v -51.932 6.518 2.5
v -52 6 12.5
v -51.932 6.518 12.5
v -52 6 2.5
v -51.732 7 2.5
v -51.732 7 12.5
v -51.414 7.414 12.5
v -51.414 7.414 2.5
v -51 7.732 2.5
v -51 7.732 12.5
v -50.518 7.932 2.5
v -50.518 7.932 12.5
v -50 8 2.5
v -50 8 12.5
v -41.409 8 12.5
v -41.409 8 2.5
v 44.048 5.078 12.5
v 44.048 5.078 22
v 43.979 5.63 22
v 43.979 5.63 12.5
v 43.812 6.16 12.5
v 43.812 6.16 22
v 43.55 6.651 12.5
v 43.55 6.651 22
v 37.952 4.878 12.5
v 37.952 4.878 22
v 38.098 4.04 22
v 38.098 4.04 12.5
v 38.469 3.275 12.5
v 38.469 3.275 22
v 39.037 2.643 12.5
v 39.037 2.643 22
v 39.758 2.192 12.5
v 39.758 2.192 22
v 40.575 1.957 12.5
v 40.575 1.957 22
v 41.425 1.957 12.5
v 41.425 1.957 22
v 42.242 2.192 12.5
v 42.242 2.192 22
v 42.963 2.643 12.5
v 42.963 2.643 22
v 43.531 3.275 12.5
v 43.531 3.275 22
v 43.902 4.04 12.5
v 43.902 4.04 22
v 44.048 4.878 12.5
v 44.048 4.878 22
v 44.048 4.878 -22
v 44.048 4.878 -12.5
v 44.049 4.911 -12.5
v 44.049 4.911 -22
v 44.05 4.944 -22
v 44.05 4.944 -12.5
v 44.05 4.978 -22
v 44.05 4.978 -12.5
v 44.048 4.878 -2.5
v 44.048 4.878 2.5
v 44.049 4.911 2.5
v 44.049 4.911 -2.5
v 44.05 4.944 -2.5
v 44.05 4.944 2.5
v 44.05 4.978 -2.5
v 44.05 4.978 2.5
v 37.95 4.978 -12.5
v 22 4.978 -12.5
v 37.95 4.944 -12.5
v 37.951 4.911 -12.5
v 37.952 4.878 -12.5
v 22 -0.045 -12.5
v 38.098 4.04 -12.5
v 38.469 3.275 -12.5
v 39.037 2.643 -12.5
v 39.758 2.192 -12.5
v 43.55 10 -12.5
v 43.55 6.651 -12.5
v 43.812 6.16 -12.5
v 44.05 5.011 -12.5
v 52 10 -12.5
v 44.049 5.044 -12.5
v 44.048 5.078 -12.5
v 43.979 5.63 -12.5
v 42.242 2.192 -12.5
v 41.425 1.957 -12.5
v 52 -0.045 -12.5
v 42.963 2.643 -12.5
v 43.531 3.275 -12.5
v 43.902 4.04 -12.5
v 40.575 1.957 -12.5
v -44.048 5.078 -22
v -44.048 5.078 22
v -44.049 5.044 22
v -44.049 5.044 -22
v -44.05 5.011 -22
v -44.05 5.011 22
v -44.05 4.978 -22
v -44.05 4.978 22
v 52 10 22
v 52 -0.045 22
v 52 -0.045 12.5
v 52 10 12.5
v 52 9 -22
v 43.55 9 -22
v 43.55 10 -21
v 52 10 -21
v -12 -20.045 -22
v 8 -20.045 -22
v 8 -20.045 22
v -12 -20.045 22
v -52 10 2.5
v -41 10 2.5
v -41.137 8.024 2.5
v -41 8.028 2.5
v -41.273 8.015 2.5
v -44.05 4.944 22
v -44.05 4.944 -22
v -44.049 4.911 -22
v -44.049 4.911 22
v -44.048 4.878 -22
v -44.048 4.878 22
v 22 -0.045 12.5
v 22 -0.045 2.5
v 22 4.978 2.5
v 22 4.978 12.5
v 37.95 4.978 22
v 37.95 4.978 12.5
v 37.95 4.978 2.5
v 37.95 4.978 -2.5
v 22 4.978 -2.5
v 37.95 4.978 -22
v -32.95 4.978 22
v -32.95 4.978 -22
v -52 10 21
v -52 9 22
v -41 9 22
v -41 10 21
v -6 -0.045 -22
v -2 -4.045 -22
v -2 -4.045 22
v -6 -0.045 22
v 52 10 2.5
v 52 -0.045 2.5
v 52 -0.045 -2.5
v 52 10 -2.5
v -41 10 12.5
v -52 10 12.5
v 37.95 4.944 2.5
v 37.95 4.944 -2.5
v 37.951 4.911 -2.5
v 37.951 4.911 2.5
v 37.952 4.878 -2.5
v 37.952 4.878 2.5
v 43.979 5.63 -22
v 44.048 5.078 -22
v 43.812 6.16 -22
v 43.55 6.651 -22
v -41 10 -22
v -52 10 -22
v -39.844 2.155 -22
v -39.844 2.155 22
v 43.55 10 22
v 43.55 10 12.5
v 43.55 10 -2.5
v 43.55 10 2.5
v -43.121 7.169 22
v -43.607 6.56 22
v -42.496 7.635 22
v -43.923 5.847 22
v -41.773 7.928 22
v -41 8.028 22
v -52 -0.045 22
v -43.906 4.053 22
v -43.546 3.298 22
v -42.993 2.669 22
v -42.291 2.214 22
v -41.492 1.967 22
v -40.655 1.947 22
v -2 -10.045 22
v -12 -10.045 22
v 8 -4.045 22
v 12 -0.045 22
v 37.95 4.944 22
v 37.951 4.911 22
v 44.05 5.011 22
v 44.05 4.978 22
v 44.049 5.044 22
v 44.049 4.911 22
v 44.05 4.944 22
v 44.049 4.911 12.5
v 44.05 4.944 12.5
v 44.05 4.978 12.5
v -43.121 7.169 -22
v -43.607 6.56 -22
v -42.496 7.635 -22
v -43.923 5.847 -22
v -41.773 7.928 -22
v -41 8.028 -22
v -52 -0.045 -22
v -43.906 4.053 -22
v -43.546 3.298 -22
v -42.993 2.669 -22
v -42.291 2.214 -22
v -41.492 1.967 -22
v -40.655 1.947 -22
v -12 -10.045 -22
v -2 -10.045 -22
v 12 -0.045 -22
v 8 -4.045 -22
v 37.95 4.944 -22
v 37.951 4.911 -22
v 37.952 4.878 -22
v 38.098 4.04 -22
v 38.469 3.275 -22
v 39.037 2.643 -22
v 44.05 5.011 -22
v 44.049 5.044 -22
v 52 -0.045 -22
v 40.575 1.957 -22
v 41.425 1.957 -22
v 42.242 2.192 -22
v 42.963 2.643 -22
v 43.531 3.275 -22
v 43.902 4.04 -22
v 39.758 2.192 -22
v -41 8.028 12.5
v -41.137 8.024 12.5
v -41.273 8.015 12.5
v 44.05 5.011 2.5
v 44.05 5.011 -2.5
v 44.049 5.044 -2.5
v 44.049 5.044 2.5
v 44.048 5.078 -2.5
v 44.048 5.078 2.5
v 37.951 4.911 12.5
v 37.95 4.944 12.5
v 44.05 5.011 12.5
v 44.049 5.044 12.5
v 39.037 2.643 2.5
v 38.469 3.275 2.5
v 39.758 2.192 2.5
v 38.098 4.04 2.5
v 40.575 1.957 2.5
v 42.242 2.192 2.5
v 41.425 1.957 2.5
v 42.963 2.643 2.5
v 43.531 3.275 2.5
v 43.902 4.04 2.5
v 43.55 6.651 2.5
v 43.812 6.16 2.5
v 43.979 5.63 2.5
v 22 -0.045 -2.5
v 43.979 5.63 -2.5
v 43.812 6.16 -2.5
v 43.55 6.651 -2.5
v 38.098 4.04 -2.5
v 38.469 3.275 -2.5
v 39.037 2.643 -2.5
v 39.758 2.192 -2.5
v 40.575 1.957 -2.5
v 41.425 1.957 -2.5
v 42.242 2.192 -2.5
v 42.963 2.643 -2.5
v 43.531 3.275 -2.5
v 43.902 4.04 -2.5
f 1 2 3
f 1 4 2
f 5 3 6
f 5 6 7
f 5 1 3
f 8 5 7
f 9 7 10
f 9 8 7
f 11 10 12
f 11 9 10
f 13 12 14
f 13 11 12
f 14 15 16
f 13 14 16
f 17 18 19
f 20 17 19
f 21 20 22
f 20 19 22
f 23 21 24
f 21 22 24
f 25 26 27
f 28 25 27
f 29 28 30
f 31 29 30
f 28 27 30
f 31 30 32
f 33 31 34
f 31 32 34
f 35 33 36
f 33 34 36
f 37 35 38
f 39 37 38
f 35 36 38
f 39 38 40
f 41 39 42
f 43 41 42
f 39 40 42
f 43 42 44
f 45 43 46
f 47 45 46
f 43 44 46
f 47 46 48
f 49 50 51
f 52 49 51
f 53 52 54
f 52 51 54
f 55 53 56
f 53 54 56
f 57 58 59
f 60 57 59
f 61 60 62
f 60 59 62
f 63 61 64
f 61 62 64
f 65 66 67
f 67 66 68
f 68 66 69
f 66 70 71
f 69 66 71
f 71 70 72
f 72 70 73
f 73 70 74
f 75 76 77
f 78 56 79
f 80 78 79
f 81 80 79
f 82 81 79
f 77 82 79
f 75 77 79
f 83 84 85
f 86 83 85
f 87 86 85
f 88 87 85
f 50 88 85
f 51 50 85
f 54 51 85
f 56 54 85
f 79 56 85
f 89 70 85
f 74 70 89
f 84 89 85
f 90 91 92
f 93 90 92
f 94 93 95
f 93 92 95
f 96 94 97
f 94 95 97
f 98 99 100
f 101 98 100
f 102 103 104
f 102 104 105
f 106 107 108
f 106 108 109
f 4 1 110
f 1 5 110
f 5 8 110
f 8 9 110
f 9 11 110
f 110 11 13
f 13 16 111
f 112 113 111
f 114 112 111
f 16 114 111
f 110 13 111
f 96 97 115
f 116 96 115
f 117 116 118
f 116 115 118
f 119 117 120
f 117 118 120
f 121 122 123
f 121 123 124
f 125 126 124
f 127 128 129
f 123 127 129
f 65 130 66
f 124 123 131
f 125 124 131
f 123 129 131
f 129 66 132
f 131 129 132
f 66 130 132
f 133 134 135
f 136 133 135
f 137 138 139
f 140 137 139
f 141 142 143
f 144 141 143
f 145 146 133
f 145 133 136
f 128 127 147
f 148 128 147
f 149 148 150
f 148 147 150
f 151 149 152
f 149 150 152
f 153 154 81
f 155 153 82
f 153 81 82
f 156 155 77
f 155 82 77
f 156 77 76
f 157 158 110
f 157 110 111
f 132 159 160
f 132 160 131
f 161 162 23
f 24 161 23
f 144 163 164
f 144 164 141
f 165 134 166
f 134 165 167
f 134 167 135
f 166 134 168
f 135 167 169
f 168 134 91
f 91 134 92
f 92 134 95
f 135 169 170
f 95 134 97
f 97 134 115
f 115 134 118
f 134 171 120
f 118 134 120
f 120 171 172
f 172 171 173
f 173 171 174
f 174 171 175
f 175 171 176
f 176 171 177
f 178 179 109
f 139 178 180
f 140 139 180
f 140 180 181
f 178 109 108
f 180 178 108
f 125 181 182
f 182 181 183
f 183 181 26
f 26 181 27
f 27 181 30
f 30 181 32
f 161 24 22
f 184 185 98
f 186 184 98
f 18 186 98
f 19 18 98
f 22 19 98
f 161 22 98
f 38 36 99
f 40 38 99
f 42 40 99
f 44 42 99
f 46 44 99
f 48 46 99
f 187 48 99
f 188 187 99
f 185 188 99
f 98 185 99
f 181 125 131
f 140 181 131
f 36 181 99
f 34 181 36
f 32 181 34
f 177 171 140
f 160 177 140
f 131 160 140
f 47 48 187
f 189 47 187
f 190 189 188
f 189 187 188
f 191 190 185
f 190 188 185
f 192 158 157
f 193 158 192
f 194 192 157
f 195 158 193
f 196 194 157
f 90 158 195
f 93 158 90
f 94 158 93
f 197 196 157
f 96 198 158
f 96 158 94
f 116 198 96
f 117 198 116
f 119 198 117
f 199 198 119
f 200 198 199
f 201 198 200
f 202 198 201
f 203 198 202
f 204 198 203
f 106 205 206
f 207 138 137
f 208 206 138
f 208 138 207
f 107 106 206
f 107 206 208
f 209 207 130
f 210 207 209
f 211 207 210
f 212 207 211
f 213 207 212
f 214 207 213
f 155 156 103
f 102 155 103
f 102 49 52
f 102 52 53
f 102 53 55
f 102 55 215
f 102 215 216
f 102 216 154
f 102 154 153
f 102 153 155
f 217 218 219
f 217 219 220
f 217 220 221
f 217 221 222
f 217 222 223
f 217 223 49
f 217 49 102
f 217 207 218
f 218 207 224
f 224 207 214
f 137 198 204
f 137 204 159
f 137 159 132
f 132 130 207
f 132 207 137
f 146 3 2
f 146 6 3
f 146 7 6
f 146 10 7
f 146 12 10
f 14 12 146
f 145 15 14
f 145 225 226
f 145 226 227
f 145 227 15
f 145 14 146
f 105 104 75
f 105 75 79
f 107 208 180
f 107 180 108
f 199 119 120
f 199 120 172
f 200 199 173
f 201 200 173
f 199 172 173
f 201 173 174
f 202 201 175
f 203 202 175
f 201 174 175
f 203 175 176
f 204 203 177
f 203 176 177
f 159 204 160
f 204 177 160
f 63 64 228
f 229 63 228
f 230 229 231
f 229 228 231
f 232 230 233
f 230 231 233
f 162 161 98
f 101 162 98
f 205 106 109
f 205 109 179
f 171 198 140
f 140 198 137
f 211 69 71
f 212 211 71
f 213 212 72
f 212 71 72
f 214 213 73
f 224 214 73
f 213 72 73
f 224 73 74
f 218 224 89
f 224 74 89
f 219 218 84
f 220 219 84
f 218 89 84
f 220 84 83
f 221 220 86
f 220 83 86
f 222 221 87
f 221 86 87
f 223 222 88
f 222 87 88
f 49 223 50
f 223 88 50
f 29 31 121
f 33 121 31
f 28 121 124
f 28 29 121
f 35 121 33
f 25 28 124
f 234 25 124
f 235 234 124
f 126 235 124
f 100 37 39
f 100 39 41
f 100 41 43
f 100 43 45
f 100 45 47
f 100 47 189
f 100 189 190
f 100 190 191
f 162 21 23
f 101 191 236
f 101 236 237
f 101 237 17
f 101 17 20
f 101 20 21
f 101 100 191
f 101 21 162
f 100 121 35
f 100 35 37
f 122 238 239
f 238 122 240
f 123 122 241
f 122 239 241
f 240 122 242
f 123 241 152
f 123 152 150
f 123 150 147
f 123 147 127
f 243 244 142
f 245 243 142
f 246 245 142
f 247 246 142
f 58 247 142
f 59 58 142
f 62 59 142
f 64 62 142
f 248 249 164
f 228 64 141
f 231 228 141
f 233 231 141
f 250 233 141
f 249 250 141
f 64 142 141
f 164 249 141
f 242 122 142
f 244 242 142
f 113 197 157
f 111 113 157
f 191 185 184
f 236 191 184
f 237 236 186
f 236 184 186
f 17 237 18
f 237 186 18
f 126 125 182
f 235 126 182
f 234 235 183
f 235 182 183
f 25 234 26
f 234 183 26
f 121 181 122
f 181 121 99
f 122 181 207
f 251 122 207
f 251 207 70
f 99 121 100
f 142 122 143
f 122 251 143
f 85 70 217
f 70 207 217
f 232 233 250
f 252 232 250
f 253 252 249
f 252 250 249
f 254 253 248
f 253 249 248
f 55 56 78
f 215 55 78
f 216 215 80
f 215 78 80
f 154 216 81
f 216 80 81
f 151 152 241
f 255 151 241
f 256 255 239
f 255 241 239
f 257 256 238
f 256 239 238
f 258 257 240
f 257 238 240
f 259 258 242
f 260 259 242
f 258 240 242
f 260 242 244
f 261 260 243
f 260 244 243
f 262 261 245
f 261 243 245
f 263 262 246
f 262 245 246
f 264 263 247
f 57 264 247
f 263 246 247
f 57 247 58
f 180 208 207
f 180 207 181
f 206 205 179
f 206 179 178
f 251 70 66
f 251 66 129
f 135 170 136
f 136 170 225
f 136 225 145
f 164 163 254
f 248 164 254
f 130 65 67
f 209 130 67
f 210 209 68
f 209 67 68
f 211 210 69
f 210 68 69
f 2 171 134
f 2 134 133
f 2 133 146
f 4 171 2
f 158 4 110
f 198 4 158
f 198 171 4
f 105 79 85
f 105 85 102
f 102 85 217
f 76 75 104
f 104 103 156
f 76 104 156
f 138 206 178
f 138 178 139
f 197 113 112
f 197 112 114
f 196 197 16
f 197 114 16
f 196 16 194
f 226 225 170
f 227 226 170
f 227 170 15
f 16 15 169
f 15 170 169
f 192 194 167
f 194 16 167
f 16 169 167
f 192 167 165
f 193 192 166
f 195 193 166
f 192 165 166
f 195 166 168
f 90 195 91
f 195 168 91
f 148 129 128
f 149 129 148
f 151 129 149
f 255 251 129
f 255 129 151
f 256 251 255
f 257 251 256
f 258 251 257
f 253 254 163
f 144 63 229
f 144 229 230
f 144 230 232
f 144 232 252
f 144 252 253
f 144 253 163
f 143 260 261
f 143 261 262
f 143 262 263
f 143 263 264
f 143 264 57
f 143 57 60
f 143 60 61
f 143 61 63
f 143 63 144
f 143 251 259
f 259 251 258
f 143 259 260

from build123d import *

# Parameters (mm, degrees)
EXTRUDE_1_DEPTH      = 10
EXTRUDE_1_DEPTH_BACK = 0.044975992
SKETCH_1_W           = 104
SKETCH_1_H           = 44
EXTRUDE_2_DEPTH      = 44
CUT_EXTRUDE_1_DEPTH  = 44
CHAMFER_4_SIZE       = 4
SKETCH_9_W           = 30
SKETCH_9_H           = 10
CUT_EXTRUDE_5_DEPTH  = 10.044975992
CUT_EXTRUDE_6_REACH  = 81.761
SKETCH_10_W          = 10
SKETCH_10_H          = 2
CUT_EXTRUDE_8_REACH  = 73.006
FILLET_1_R           = 2
CHAMFER_6_SIZE       = 1
CUT_EXTRUDE_9_DEPTH  = 44


with BuildPart() as part:
    # 草图1 → 凸台-拉伸1 (new, two sides: drawn at the far end of the back side and taken through both)
    with BuildSketch(Plane(origin=(0, 0, 0), x_dir=(1, 0, 0), z_dir=(0, 1, 0)).offset(-EXTRUDE_1_DEPTH_BACK)):
        Rectangle(SKETCH_1_W, SKETCH_1_H)
    extrude(amount=EXTRUDE_1_DEPTH + EXTRUDE_1_DEPTH_BACK)

    # 草图2 → 凸台-拉伸2 (add)
    with BuildSketch(Plane(origin=(0, 0, -22), x_dir=(-1, 0, 0), z_dir=(0, 0, -1))):
        Polygon((12, -20.044975992), (12, -10.044975992), (2, -10.044975992), (2, -0.044975992), (-8, -0.044975992), (-8, -10.525129165), (-8, -20.044975992), align=None)
    extrude(amount=-EXTRUDE_2_DEPTH)

    # 草图3 → 切除-拉伸1 (cut)
    with BuildSketch(Plane.XY.offset(22)):
        with BuildLine():
            Line((-44.05, 4.977512004), (-37.95, 4.977512004))
            ThreePointArc((-37.95, 4.977512004), (-37.950409974, 5.027518726), (-37.951639785, 5.077512004))
            Line((-37.951639785, 5.077512004), (-44.048360215, 5.077512004))
            ThreePointArc((-44.048360215, 5.077512004), (-44.049590026, 5.027518726), (-44.05, 4.977512004))
        make_face()
        with BuildLine():
            ThreePointArc((-37.951639785, 4.877512004), (-37.950409974, 4.927505282), (-37.95, 4.977512004))
            Line((-37.95, 4.977512004), (-44.05, 4.977512004))
            ThreePointArc((-44.05, 4.977512004), (-44.049590026, 4.927505282), (-44.048360215, 4.877512004))
            Line((-44.048360215, 4.877512004), (-37.951639785, 4.877512004))
        make_face()
        with BuildLine():
            ThreePointArc((-44.048360215, 4.877512004), (-41, 1.927512004), (-37.951639785, 4.877512004))
            Line((-37.951639785, 4.877512004), (-44.048360215, 4.877512004))
        make_face()
        with BuildLine():
            Line((-44.048360215, 5.077512004), (-37.951639785, 5.077512004))
            ThreePointArc((-37.951639785, 5.077512004), (-41, 8.027512004), (-44.048360215, 5.077512004))
        make_face()
        with BuildLine():
            Line((37.95, 4.977512004), (44.05, 4.977512004))
            ThreePointArc((44.05, 4.977512004), (44.049590026, 5.027518726), (44.048360215, 5.077512004))
            Line((44.048360215, 5.077512004), (37.951639785, 5.077512004))
            ThreePointArc((37.951639785, 5.077512004), (37.950409974, 5.027518726), (37.95, 4.977512004))
        make_face()
        with BuildLine():
            ThreePointArc((44.048360215, 4.877512004), (44.049590026, 4.927505282), (44.05, 4.977512004))
            Line((44.05, 4.977512004), (37.95, 4.977512004))
            ThreePointArc((37.95, 4.977512004), (37.950409974, 4.927505282), (37.951639785, 4.877512004))
            Line((37.951639785, 4.877512004), (44.048360215, 4.877512004))
        make_face()
        with BuildLine():
            ThreePointArc((37.951639785, 4.877512004), (41, 1.927512004), (44.048360215, 4.877512004))
            Line((44.048360215, 4.877512004), (37.951639785, 4.877512004))
        make_face()
        with BuildLine():
            Line((37.951639785, 5.077512004), (44.048360215, 5.077512004))
            ThreePointArc((44.048360215, 5.077512004), (41, 8.027512004), (37.951639785, 5.077512004))
        make_face()
    extrude(amount=-CUT_EXTRUDE_1_DEPTH, mode=Mode.SUBTRACT)

    # 倒角4
    chamfer_4_edges = [part.edges().sort_by_distance(p)[0] for p in [
        (-2, -0.044975992, 0),
        (8, -0.044975992, 0),
    ]]
    chamfer(chamfer_4_edges, length=CHAMFER_4_SIZE)

    # 草图9 → 切除-拉伸5 (cut)
    with BuildSketch(Plane.XZ.offset(0.044975992)):
        with Locations((37, 7.5)):
            Rectangle(SKETCH_9_W, SKETCH_9_H)
        with Locations((37, -7.5)):
            Rectangle(SKETCH_9_W, SKETCH_9_H)
    extrude(amount=-CUT_EXTRUDE_5_DEPTH, mode=Mode.SUBTRACT)

    # 切除-拉伸6: up to this face of the body (flat: up to its plane)
    cut_extrude_6_end = Plane(part.part.faces().sort_by_distance((-52, 4.977512004, 0))[0])
    # 草图10 → 切除-拉伸6 (cut, up to the picked face)
    with BuildSketch(Plane(origin=(22, 0, 0), x_dir=(0, 0, -1), z_dir=(1, 0, 0)), mode=Mode.PRIVATE) as cut_extrude_6_sk1:
        with Locations((-7.5, 9)):
            Rectangle(SKETCH_10_W, SKETCH_10_H)
    cut_extrude_6_tool1 = split(extrude(cut_extrude_6_sk1.sketch, amount=-CUT_EXTRUDE_6_REACH, mode=Mode.PRIVATE), bisect_by=cut_extrude_6_end, keep=Keep.BOTH, mode=Mode.PRIVATE)
    add(cut_extrude_6_tool1.solids().sort_by(Axis((22, 9, 7.5), (-1, 0, 0)))[0], mode=Mode.SUBTRACT)

    # 切除-拉伸8: up to this face of the body (flat: up to its plane)
    cut_extrude_8_end = Plane(part.part.faces().sort_by_distance((-0.039931558, 1.054666799, 22))[0])
    # 草图12 → 切除-拉伸8 (cut, up to the picked face)
    with BuildSketch(Plane(origin=(0, 0, -22), x_dir=(-1, 0, 0), z_dir=(0, 0, -1)), mode=Mode.PRIVATE) as cut_extrude_8_sk1:
        with BuildLine():
            Line((41, 10), (-43.55, 10))
            Line((-43.55, 10), (-43.55, 6.650832057))
            ThreePointArc((-43.55, 6.650832057), (-40.12678754, 7.899839843), (-37.95, 4.977512004))
            Line((-37.95, 4.977512004), (37.95, 4.977512004))
            ThreePointArc((37.95, 4.977512004), (38.843324317, 7.134187686), (41, 8.027512004))
            Line((41, 8.027512004), (41, 10))
        make_face()
    cut_extrude_8_tool1 = split(extrude(cut_extrude_8_sk1.sketch, amount=-CUT_EXTRUDE_8_REACH, mode=Mode.PRIVATE), bisect_by=cut_extrude_8_end, keep=Keep.BOTH, mode=Mode.PRIVATE)
    add(cut_extrude_8_tool1.solids().sort_by(Axis((0.637872, 7.552245, -22), (0, 0, 1)))[0], mode=Mode.SUBTRACT)

    # 圆角1
    fillet_1_edges = [part.edges().sort_by_distance(p)[0] for p in [
        (-52, 8, 7.5),
    ]]
    fillet(fillet_1_edges, radius=FILLET_1_R)

    # 倒角6
    chamfer_6_edges = [part.edges().sort_by_distance(p)[0] for p in [
        (47.775, 10, -22),
        (-46.5, 10, 22),
    ]]
    chamfer(chamfer_6_edges, length=CHAMFER_6_SIZE)

    # 草图13 → 切除-拉伸9 (cut)
    with BuildSketch(Plane.XY.offset(22)):
        with BuildLine():
            ThreePointArc((-37.95, 4.977512004), (-38.4675062, 3.277813455), (-39.844409938, 2.154904768))
            Line((-39.844409938, 2.154904768), (-32.95, 4.977512004))
            Line((-32.95, 4.977512004), (-37.95, 4.977512004))
        make_face()
    extrude(amount=-CUT_EXTRUDE_9_DEPTH, mode=Mode.SUBTRACT)


solid = part.part
